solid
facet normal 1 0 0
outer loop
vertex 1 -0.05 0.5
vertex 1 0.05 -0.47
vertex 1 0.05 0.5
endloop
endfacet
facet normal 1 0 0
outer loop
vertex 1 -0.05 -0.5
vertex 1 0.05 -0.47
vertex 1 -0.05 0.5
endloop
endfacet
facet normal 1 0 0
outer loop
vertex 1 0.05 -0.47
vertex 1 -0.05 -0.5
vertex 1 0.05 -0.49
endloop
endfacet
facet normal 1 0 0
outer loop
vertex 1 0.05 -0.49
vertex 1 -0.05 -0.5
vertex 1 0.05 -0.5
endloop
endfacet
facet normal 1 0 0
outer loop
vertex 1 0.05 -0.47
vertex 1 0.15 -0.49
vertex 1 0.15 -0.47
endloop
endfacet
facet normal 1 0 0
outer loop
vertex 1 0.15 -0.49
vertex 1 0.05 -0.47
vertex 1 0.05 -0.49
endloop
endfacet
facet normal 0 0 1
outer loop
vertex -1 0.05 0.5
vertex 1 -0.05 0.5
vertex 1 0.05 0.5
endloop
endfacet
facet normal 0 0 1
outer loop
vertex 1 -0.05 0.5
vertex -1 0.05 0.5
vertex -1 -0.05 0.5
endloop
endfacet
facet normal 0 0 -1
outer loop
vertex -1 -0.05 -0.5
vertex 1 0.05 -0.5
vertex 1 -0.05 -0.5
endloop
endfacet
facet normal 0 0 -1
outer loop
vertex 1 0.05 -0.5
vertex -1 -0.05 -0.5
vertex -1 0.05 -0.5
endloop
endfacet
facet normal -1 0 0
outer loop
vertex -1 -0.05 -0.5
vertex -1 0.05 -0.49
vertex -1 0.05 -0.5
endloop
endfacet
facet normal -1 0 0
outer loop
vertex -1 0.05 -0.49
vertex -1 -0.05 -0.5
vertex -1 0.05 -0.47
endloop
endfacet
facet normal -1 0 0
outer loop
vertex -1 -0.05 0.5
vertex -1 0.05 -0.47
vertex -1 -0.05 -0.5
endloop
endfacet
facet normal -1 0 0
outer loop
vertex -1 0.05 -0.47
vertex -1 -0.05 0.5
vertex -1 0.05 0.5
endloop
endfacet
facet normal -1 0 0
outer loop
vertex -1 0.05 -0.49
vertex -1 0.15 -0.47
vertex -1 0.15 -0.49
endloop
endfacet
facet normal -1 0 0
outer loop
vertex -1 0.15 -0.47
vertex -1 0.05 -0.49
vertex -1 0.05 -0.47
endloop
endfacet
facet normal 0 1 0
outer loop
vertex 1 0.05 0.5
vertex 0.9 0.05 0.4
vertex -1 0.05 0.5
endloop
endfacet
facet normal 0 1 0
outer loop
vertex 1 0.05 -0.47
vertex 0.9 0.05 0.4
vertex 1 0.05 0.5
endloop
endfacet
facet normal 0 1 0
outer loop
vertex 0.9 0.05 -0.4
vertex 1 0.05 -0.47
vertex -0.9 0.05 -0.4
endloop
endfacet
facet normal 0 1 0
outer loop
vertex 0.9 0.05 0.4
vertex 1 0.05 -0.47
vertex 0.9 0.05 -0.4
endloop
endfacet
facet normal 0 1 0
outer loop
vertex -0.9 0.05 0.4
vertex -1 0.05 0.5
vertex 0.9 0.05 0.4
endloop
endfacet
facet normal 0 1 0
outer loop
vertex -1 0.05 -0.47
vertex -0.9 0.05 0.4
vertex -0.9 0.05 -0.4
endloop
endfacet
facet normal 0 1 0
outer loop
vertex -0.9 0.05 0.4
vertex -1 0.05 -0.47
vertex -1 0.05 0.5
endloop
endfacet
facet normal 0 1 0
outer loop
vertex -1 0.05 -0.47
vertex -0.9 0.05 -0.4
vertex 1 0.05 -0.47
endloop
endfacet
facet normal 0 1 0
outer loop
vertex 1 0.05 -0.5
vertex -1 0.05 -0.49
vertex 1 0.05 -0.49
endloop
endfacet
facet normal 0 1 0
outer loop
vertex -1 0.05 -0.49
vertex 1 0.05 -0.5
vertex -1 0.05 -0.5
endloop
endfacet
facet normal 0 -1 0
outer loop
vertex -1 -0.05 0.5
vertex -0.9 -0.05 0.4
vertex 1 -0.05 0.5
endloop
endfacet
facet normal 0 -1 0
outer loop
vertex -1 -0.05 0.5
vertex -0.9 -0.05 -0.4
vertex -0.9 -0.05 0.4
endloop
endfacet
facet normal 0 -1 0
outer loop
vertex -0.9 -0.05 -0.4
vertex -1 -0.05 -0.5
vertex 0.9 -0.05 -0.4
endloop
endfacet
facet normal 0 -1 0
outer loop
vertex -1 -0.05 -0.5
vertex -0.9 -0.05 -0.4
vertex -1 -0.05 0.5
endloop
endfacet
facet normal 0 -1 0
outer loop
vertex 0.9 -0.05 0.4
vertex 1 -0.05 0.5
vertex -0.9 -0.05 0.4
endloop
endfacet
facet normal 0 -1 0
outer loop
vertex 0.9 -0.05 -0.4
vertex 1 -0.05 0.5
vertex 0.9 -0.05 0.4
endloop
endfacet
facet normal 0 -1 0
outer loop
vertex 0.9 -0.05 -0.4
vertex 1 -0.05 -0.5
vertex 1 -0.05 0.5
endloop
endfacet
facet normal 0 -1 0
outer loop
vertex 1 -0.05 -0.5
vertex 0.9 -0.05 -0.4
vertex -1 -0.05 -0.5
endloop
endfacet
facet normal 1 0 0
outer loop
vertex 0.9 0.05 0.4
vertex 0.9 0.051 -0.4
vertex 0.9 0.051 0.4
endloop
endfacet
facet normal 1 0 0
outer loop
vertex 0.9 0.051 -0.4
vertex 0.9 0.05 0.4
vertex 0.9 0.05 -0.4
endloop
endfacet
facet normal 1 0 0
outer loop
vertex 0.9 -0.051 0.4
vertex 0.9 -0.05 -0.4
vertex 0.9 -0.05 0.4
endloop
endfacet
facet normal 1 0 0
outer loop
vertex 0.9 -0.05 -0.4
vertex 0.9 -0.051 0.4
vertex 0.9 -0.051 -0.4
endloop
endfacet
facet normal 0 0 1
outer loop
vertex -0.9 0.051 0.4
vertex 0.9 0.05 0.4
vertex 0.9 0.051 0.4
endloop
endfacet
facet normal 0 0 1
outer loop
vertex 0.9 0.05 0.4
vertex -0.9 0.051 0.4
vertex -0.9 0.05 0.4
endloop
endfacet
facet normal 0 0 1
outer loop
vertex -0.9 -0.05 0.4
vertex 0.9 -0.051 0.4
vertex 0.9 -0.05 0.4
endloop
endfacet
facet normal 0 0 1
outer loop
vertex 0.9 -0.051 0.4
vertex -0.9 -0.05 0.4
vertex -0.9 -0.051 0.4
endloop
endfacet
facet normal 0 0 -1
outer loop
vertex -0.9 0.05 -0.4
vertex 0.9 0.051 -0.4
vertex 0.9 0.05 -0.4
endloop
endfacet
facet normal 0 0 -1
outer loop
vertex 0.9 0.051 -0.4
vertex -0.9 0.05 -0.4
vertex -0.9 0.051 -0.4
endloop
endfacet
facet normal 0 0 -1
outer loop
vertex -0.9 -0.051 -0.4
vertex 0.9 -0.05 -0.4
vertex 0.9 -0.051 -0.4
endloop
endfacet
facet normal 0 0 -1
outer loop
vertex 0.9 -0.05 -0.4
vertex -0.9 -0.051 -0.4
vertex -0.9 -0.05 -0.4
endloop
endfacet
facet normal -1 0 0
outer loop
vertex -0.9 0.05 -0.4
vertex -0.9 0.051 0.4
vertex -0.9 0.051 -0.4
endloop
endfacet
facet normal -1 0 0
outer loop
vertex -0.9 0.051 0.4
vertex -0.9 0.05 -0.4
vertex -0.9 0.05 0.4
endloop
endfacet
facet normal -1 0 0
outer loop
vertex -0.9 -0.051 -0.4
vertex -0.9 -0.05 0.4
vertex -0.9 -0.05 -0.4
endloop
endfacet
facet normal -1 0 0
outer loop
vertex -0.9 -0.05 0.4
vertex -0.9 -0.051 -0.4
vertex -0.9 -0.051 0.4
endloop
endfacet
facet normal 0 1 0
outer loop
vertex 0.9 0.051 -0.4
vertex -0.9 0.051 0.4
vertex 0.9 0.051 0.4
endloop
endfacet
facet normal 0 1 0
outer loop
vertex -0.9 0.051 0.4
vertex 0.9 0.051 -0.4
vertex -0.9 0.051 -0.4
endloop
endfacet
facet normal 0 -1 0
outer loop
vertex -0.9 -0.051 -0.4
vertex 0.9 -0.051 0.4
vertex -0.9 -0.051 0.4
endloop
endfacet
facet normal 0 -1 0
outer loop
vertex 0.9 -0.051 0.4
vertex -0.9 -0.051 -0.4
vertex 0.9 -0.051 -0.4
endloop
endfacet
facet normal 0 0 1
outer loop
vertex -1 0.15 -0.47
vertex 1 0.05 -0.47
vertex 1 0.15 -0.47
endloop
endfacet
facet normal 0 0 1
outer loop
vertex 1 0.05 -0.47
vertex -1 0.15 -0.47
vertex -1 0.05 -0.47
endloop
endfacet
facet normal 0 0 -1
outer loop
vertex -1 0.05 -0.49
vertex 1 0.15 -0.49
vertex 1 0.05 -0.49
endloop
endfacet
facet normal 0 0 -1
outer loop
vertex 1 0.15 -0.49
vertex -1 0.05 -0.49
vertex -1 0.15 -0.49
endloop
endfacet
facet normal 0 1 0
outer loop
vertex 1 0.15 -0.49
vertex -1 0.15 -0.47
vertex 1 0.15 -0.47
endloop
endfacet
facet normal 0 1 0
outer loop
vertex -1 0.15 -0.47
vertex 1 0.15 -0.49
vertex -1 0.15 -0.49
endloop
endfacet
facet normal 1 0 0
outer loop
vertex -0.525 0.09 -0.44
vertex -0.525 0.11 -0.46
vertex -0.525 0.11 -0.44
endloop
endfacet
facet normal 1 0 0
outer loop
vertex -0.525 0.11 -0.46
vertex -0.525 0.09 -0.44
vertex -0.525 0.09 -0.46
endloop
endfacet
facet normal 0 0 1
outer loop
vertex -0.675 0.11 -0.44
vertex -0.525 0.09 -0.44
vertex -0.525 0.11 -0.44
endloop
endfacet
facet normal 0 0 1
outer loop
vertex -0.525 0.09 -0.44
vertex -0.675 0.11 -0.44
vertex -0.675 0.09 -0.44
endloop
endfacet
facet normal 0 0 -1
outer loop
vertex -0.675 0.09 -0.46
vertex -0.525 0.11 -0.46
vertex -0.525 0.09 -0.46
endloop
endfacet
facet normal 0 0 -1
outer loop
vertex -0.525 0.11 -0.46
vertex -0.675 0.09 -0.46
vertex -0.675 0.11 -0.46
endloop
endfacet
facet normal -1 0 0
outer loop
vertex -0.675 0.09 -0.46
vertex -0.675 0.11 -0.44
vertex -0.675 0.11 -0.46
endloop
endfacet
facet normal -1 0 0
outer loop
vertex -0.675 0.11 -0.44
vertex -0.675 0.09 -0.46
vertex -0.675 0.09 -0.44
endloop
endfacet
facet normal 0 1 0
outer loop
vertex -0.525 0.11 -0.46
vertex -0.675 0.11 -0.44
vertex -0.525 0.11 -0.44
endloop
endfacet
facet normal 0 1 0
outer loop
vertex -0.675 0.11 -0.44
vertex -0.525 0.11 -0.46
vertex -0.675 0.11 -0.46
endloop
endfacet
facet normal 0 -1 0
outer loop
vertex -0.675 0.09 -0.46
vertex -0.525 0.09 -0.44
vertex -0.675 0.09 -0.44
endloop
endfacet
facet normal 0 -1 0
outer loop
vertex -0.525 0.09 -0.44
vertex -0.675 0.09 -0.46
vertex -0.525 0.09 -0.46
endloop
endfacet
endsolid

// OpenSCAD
union(){

color("#c87d3a")
cube([2,0.1,1],center =true);

color("#424e63")
cube([1.8,0.102,0.8],center =true);


translate([0,0.1,-0.48])
color("#8b8f2b")
cube([2,0.1,0.02],center =true);

translate([-0.6,0.1,-0.45])
color("white")
cube([0.15,0.02,0.02],center =true);
}
